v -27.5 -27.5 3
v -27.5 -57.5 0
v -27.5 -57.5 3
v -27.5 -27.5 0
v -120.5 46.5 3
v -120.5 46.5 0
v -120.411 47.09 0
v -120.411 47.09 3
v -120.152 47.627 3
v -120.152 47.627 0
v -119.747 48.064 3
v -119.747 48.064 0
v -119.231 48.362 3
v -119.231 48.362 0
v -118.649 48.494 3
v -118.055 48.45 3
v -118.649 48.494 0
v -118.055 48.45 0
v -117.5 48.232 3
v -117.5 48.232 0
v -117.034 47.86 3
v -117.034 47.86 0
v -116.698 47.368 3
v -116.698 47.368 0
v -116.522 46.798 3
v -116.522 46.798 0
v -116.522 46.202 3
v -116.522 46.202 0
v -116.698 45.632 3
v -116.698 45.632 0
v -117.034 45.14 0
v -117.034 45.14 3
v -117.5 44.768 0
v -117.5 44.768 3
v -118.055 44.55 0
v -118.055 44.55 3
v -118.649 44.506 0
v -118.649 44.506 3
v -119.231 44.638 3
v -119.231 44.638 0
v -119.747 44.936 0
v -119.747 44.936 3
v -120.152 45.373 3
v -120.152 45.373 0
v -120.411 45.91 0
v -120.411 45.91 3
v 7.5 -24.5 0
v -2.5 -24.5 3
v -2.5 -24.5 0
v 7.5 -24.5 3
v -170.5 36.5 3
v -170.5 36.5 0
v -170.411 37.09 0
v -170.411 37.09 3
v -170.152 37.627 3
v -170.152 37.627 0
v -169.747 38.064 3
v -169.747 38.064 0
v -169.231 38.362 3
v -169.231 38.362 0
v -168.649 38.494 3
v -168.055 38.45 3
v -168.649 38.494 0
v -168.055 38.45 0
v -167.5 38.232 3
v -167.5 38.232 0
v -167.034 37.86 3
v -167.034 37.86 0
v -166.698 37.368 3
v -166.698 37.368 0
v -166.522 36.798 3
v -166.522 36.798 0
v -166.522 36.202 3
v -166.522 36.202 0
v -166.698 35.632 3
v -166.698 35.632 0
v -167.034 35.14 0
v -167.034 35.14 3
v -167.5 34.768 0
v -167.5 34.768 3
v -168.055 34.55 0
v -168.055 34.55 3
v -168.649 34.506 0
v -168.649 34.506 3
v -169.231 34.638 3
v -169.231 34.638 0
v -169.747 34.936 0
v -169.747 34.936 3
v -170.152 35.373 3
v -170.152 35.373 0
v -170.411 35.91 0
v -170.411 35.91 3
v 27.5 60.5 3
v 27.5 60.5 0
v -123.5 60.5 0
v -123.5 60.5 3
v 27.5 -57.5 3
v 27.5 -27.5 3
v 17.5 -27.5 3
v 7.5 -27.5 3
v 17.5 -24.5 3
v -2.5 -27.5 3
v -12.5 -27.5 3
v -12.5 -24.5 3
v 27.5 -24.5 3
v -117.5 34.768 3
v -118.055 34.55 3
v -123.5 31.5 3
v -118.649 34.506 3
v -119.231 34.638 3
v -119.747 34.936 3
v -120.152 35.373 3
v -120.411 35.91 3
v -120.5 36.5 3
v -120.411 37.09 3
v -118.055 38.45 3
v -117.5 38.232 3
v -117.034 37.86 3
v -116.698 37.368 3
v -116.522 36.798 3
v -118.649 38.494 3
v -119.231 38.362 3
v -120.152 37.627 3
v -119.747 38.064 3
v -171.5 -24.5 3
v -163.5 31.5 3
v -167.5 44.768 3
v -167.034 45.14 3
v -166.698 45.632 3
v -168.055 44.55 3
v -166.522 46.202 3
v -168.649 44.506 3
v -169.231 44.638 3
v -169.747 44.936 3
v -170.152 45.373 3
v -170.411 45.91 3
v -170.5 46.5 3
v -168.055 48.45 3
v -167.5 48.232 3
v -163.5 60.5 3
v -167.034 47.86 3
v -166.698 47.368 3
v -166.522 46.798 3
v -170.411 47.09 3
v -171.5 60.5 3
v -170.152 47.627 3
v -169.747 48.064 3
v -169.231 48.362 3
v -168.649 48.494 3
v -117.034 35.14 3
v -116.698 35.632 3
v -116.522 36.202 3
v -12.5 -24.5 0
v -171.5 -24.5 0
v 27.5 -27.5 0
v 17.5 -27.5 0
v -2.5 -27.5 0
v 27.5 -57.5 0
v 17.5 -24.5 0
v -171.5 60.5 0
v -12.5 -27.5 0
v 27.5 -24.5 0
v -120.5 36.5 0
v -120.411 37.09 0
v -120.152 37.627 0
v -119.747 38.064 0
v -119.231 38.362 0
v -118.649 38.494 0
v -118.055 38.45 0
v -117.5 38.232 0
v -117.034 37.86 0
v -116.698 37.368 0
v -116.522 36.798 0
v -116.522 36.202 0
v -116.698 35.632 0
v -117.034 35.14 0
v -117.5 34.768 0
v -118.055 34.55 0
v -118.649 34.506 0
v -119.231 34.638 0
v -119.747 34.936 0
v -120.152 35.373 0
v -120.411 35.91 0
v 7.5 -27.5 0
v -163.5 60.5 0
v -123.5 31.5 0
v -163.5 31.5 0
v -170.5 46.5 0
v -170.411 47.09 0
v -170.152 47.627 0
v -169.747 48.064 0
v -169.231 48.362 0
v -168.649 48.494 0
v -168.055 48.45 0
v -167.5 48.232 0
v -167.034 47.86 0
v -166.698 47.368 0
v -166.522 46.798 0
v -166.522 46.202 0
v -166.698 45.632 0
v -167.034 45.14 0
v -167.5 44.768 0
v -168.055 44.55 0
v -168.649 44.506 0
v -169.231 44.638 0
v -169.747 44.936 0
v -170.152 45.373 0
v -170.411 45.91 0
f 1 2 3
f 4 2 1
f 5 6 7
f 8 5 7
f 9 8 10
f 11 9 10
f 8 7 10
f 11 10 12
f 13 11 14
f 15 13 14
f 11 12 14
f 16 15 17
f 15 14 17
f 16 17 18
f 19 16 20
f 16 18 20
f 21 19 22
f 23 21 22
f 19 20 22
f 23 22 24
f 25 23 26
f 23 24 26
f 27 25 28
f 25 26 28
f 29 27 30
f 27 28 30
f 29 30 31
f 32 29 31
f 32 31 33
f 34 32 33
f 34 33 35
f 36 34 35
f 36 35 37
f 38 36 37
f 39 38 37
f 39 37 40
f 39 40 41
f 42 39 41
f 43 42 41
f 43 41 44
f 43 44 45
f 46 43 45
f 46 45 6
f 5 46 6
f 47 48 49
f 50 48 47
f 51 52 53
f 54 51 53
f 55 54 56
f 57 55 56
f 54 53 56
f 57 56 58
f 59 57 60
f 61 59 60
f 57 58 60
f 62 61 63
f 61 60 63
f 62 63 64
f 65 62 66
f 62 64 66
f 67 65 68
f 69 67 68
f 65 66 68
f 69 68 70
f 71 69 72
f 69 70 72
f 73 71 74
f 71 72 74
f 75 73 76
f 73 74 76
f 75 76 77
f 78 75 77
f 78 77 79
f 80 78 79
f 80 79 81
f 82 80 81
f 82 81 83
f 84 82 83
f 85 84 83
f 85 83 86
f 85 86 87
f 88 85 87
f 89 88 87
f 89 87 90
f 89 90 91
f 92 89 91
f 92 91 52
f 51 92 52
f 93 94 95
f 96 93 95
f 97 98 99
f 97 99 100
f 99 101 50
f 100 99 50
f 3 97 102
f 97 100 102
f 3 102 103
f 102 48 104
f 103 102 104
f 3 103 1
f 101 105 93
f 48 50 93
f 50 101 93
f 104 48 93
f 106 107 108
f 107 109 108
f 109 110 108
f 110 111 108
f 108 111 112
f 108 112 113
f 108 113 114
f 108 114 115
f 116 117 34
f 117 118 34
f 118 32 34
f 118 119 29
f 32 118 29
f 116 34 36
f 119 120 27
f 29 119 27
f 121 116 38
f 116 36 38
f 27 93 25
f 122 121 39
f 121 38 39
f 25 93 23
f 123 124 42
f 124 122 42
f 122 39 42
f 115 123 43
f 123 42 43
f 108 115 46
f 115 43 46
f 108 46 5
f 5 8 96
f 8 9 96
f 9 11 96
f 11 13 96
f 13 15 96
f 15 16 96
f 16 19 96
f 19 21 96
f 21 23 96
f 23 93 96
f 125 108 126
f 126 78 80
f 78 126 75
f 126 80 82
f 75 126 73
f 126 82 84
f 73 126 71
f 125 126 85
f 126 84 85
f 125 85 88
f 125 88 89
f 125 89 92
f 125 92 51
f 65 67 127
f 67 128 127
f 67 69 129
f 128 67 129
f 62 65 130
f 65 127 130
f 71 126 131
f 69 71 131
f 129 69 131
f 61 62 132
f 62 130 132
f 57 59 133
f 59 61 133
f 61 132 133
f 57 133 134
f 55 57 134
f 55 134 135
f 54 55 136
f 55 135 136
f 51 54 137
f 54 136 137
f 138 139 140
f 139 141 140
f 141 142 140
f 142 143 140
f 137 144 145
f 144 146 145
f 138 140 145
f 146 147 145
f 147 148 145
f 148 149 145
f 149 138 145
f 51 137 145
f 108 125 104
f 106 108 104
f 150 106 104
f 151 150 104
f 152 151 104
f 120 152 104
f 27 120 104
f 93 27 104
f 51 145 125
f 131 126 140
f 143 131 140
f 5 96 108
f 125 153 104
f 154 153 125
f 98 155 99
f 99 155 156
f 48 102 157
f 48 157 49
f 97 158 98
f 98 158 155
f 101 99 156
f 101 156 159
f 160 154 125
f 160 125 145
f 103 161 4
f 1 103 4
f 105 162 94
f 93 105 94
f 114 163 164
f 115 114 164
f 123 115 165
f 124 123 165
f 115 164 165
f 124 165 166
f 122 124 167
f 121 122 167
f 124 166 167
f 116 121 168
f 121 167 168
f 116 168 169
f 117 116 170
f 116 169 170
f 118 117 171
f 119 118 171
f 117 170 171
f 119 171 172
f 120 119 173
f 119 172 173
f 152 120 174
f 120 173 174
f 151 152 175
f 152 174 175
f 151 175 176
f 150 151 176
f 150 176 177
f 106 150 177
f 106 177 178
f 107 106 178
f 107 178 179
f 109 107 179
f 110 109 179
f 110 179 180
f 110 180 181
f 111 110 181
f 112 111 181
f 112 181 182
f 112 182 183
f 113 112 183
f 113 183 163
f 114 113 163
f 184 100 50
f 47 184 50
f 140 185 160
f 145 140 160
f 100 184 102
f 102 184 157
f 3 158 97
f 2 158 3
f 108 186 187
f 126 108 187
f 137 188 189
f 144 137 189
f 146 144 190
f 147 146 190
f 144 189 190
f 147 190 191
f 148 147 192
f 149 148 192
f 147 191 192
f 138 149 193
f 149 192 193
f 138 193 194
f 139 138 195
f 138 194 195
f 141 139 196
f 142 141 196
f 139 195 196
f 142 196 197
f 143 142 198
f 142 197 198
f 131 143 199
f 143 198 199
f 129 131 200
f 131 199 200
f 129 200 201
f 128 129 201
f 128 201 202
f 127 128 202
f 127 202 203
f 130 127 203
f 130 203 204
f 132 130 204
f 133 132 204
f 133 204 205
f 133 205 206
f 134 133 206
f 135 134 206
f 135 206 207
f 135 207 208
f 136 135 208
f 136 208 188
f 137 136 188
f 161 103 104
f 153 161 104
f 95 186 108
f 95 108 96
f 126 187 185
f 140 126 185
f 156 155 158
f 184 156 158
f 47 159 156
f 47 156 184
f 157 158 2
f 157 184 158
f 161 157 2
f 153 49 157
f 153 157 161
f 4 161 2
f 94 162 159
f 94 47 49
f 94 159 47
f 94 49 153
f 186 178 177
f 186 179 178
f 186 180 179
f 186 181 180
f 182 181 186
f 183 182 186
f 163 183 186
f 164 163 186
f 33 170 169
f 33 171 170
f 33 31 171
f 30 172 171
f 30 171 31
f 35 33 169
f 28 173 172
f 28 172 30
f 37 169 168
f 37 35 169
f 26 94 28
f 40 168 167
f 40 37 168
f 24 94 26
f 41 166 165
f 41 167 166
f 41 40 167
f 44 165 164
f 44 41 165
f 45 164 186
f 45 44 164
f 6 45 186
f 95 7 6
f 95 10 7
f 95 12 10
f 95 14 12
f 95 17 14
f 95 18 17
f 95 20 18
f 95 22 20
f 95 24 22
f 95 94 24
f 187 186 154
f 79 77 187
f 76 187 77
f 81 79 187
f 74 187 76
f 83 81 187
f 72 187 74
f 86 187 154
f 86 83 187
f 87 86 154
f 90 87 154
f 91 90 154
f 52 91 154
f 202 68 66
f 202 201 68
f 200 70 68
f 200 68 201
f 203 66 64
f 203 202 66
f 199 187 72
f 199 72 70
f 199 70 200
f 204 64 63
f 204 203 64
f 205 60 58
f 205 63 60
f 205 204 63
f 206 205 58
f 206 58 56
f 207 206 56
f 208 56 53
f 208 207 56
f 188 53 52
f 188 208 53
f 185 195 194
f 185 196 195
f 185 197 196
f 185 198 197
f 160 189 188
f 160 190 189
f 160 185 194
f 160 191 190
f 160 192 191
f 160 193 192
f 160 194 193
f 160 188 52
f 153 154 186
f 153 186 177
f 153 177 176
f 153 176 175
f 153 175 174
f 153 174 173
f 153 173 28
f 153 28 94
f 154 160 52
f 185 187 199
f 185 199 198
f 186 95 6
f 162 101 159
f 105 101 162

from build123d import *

# Parameters (mm, degrees)
SKETCH1_W           = 55
SKETCH1_H           = 55
BOSS_EXTRUDE1_DEPTH = 3
SKETCH2_W           = 10
SKETCH2_H           = 3
SKETCH2_W_2         = 15
CUT_EXTRUDE1_DEPTH  = 3
SKETCH3_W           = 55
SKETCH3_H           = 30
BOSS_EXTRUDE2_DEPTH = 3
SKETCH4_W           = 144
SKETCH4_H           = 52
BOSS_EXTRUDE3_DEPTH = 3
SKETCH5_W           = 199
SKETCH5_H           = 13
BOSS_EXTRUDE4_DEPTH = 3
SKETCH6_W           = 199
SKETCH6_H           = 20
BOSS_EXTRUDE5_DEPTH = 3
SKETCH7_R           = 2
SKETCH7_W           = 40
SKETCH7_H           = 20
CUT_EXTRUDE22_DEPTH = 33
SKETCH8_W           = 40
SKETCH8_H           = 9
CUT_EXTRUDE23_DEPTH = 33


with BuildPart() as part:
    # Sketch1 → Boss-Extrude1 (new body)
    with BuildSketch(Plane.XY):
        Rectangle(SKETCH1_W, SKETCH1_H)
    extrude(amount=BOSS_EXTRUDE1_DEPTH)

    # Sketch2 → Cut-Extrude1 (cut)
    with BuildSketch(Plane.XY.offset(3)):
        with Locations((22.5, -26)):
            Rectangle(SKETCH2_W, SKETCH2_H)
        with Locations((2.5, -26)):
            Rectangle(SKETCH2_W, SKETCH2_H)
        with Locations((-20, -26)):
            Rectangle(SKETCH2_W_2, SKETCH2_H)
    extrude(amount=-CUT_EXTRUDE1_DEPTH, mode=Mode.SUBTRACT)

    # Sketch3 → Boss-Extrude2 (add)
    with BuildSketch(Plane(origin=(0, 0, 0), x_dir=(-1, 0, 0), z_dir=(0, 0, -1))):
        with Locations((0, -42.5)):
            Rectangle(SKETCH3_W, SKETCH3_H)
    extrude(amount=-BOSS_EXTRUDE2_DEPTH)

    # Sketch4 → Boss-Extrude3 (add)
    with BuildSketch(Plane(origin=(0, 0, 0), x_dir=(-1, 0, 0), z_dir=(0, 0, -1))):
        with Locations((99.5, 1.5)):
            Rectangle(SKETCH4_W, SKETCH4_H)
    extrude(amount=-BOSS_EXTRUDE3_DEPTH)

    # Sketch5 → Boss-Extrude4 (add)
    with BuildSketch(Plane(origin=(0, 0, 0), x_dir=(-1, 0, 0), z_dir=(0, 0, -1))):
        with Locations((72, 34)):
            Rectangle(SKETCH5_W, SKETCH5_H)
    extrude(amount=-BOSS_EXTRUDE4_DEPTH)

    # Sketch6 → Boss-Extrude5 (add)
    with BuildSketch(Plane(origin=(0, 0, 0), x_dir=(-1, 0, 0), z_dir=(0, 0, -1))):
        with Locations((72, 50.5)):
            Rectangle(SKETCH6_W, SKETCH6_H)
    extrude(amount=-BOSS_EXTRUDE5_DEPTH)

    # Sketch7 → Cut-Extrude22 (cut)
    with BuildSketch(Plane(origin=(0, 0, 0), x_dir=(-1, 0, 0), z_dir=(0, 0, -1))):
        with Locations((168.5, 46.5)):
            Circle(SKETCH7_R)
        with Locations((168.5, 36.5)):
            Circle(SKETCH7_R)
        with Locations((118.5, 36.5)):
            Circle(SKETCH7_R)
        with Locations((118.5, 46.5)):
            Circle(SKETCH7_R)
        with Locations((143.5, 41.5)):
            Rectangle(SKETCH7_W, SKETCH7_H)
    extrude(amount=-CUT_EXTRUDE22_DEPTH, mode=Mode.SUBTRACT)

    # Sketch8 → Cut-Extrude23 (cut)
    with BuildSketch(Plane(origin=(0, 0, 0), x_dir=(-1, 0, 0), z_dir=(0, 0, -1))):
        with Locations((143.5, 56)):
            Rectangle(SKETCH8_W, SKETCH8_H)
    extrude(amount=-CUT_EXTRUDE23_DEPTH, mode=Mode.SUBTRACT)


solid = part.part
